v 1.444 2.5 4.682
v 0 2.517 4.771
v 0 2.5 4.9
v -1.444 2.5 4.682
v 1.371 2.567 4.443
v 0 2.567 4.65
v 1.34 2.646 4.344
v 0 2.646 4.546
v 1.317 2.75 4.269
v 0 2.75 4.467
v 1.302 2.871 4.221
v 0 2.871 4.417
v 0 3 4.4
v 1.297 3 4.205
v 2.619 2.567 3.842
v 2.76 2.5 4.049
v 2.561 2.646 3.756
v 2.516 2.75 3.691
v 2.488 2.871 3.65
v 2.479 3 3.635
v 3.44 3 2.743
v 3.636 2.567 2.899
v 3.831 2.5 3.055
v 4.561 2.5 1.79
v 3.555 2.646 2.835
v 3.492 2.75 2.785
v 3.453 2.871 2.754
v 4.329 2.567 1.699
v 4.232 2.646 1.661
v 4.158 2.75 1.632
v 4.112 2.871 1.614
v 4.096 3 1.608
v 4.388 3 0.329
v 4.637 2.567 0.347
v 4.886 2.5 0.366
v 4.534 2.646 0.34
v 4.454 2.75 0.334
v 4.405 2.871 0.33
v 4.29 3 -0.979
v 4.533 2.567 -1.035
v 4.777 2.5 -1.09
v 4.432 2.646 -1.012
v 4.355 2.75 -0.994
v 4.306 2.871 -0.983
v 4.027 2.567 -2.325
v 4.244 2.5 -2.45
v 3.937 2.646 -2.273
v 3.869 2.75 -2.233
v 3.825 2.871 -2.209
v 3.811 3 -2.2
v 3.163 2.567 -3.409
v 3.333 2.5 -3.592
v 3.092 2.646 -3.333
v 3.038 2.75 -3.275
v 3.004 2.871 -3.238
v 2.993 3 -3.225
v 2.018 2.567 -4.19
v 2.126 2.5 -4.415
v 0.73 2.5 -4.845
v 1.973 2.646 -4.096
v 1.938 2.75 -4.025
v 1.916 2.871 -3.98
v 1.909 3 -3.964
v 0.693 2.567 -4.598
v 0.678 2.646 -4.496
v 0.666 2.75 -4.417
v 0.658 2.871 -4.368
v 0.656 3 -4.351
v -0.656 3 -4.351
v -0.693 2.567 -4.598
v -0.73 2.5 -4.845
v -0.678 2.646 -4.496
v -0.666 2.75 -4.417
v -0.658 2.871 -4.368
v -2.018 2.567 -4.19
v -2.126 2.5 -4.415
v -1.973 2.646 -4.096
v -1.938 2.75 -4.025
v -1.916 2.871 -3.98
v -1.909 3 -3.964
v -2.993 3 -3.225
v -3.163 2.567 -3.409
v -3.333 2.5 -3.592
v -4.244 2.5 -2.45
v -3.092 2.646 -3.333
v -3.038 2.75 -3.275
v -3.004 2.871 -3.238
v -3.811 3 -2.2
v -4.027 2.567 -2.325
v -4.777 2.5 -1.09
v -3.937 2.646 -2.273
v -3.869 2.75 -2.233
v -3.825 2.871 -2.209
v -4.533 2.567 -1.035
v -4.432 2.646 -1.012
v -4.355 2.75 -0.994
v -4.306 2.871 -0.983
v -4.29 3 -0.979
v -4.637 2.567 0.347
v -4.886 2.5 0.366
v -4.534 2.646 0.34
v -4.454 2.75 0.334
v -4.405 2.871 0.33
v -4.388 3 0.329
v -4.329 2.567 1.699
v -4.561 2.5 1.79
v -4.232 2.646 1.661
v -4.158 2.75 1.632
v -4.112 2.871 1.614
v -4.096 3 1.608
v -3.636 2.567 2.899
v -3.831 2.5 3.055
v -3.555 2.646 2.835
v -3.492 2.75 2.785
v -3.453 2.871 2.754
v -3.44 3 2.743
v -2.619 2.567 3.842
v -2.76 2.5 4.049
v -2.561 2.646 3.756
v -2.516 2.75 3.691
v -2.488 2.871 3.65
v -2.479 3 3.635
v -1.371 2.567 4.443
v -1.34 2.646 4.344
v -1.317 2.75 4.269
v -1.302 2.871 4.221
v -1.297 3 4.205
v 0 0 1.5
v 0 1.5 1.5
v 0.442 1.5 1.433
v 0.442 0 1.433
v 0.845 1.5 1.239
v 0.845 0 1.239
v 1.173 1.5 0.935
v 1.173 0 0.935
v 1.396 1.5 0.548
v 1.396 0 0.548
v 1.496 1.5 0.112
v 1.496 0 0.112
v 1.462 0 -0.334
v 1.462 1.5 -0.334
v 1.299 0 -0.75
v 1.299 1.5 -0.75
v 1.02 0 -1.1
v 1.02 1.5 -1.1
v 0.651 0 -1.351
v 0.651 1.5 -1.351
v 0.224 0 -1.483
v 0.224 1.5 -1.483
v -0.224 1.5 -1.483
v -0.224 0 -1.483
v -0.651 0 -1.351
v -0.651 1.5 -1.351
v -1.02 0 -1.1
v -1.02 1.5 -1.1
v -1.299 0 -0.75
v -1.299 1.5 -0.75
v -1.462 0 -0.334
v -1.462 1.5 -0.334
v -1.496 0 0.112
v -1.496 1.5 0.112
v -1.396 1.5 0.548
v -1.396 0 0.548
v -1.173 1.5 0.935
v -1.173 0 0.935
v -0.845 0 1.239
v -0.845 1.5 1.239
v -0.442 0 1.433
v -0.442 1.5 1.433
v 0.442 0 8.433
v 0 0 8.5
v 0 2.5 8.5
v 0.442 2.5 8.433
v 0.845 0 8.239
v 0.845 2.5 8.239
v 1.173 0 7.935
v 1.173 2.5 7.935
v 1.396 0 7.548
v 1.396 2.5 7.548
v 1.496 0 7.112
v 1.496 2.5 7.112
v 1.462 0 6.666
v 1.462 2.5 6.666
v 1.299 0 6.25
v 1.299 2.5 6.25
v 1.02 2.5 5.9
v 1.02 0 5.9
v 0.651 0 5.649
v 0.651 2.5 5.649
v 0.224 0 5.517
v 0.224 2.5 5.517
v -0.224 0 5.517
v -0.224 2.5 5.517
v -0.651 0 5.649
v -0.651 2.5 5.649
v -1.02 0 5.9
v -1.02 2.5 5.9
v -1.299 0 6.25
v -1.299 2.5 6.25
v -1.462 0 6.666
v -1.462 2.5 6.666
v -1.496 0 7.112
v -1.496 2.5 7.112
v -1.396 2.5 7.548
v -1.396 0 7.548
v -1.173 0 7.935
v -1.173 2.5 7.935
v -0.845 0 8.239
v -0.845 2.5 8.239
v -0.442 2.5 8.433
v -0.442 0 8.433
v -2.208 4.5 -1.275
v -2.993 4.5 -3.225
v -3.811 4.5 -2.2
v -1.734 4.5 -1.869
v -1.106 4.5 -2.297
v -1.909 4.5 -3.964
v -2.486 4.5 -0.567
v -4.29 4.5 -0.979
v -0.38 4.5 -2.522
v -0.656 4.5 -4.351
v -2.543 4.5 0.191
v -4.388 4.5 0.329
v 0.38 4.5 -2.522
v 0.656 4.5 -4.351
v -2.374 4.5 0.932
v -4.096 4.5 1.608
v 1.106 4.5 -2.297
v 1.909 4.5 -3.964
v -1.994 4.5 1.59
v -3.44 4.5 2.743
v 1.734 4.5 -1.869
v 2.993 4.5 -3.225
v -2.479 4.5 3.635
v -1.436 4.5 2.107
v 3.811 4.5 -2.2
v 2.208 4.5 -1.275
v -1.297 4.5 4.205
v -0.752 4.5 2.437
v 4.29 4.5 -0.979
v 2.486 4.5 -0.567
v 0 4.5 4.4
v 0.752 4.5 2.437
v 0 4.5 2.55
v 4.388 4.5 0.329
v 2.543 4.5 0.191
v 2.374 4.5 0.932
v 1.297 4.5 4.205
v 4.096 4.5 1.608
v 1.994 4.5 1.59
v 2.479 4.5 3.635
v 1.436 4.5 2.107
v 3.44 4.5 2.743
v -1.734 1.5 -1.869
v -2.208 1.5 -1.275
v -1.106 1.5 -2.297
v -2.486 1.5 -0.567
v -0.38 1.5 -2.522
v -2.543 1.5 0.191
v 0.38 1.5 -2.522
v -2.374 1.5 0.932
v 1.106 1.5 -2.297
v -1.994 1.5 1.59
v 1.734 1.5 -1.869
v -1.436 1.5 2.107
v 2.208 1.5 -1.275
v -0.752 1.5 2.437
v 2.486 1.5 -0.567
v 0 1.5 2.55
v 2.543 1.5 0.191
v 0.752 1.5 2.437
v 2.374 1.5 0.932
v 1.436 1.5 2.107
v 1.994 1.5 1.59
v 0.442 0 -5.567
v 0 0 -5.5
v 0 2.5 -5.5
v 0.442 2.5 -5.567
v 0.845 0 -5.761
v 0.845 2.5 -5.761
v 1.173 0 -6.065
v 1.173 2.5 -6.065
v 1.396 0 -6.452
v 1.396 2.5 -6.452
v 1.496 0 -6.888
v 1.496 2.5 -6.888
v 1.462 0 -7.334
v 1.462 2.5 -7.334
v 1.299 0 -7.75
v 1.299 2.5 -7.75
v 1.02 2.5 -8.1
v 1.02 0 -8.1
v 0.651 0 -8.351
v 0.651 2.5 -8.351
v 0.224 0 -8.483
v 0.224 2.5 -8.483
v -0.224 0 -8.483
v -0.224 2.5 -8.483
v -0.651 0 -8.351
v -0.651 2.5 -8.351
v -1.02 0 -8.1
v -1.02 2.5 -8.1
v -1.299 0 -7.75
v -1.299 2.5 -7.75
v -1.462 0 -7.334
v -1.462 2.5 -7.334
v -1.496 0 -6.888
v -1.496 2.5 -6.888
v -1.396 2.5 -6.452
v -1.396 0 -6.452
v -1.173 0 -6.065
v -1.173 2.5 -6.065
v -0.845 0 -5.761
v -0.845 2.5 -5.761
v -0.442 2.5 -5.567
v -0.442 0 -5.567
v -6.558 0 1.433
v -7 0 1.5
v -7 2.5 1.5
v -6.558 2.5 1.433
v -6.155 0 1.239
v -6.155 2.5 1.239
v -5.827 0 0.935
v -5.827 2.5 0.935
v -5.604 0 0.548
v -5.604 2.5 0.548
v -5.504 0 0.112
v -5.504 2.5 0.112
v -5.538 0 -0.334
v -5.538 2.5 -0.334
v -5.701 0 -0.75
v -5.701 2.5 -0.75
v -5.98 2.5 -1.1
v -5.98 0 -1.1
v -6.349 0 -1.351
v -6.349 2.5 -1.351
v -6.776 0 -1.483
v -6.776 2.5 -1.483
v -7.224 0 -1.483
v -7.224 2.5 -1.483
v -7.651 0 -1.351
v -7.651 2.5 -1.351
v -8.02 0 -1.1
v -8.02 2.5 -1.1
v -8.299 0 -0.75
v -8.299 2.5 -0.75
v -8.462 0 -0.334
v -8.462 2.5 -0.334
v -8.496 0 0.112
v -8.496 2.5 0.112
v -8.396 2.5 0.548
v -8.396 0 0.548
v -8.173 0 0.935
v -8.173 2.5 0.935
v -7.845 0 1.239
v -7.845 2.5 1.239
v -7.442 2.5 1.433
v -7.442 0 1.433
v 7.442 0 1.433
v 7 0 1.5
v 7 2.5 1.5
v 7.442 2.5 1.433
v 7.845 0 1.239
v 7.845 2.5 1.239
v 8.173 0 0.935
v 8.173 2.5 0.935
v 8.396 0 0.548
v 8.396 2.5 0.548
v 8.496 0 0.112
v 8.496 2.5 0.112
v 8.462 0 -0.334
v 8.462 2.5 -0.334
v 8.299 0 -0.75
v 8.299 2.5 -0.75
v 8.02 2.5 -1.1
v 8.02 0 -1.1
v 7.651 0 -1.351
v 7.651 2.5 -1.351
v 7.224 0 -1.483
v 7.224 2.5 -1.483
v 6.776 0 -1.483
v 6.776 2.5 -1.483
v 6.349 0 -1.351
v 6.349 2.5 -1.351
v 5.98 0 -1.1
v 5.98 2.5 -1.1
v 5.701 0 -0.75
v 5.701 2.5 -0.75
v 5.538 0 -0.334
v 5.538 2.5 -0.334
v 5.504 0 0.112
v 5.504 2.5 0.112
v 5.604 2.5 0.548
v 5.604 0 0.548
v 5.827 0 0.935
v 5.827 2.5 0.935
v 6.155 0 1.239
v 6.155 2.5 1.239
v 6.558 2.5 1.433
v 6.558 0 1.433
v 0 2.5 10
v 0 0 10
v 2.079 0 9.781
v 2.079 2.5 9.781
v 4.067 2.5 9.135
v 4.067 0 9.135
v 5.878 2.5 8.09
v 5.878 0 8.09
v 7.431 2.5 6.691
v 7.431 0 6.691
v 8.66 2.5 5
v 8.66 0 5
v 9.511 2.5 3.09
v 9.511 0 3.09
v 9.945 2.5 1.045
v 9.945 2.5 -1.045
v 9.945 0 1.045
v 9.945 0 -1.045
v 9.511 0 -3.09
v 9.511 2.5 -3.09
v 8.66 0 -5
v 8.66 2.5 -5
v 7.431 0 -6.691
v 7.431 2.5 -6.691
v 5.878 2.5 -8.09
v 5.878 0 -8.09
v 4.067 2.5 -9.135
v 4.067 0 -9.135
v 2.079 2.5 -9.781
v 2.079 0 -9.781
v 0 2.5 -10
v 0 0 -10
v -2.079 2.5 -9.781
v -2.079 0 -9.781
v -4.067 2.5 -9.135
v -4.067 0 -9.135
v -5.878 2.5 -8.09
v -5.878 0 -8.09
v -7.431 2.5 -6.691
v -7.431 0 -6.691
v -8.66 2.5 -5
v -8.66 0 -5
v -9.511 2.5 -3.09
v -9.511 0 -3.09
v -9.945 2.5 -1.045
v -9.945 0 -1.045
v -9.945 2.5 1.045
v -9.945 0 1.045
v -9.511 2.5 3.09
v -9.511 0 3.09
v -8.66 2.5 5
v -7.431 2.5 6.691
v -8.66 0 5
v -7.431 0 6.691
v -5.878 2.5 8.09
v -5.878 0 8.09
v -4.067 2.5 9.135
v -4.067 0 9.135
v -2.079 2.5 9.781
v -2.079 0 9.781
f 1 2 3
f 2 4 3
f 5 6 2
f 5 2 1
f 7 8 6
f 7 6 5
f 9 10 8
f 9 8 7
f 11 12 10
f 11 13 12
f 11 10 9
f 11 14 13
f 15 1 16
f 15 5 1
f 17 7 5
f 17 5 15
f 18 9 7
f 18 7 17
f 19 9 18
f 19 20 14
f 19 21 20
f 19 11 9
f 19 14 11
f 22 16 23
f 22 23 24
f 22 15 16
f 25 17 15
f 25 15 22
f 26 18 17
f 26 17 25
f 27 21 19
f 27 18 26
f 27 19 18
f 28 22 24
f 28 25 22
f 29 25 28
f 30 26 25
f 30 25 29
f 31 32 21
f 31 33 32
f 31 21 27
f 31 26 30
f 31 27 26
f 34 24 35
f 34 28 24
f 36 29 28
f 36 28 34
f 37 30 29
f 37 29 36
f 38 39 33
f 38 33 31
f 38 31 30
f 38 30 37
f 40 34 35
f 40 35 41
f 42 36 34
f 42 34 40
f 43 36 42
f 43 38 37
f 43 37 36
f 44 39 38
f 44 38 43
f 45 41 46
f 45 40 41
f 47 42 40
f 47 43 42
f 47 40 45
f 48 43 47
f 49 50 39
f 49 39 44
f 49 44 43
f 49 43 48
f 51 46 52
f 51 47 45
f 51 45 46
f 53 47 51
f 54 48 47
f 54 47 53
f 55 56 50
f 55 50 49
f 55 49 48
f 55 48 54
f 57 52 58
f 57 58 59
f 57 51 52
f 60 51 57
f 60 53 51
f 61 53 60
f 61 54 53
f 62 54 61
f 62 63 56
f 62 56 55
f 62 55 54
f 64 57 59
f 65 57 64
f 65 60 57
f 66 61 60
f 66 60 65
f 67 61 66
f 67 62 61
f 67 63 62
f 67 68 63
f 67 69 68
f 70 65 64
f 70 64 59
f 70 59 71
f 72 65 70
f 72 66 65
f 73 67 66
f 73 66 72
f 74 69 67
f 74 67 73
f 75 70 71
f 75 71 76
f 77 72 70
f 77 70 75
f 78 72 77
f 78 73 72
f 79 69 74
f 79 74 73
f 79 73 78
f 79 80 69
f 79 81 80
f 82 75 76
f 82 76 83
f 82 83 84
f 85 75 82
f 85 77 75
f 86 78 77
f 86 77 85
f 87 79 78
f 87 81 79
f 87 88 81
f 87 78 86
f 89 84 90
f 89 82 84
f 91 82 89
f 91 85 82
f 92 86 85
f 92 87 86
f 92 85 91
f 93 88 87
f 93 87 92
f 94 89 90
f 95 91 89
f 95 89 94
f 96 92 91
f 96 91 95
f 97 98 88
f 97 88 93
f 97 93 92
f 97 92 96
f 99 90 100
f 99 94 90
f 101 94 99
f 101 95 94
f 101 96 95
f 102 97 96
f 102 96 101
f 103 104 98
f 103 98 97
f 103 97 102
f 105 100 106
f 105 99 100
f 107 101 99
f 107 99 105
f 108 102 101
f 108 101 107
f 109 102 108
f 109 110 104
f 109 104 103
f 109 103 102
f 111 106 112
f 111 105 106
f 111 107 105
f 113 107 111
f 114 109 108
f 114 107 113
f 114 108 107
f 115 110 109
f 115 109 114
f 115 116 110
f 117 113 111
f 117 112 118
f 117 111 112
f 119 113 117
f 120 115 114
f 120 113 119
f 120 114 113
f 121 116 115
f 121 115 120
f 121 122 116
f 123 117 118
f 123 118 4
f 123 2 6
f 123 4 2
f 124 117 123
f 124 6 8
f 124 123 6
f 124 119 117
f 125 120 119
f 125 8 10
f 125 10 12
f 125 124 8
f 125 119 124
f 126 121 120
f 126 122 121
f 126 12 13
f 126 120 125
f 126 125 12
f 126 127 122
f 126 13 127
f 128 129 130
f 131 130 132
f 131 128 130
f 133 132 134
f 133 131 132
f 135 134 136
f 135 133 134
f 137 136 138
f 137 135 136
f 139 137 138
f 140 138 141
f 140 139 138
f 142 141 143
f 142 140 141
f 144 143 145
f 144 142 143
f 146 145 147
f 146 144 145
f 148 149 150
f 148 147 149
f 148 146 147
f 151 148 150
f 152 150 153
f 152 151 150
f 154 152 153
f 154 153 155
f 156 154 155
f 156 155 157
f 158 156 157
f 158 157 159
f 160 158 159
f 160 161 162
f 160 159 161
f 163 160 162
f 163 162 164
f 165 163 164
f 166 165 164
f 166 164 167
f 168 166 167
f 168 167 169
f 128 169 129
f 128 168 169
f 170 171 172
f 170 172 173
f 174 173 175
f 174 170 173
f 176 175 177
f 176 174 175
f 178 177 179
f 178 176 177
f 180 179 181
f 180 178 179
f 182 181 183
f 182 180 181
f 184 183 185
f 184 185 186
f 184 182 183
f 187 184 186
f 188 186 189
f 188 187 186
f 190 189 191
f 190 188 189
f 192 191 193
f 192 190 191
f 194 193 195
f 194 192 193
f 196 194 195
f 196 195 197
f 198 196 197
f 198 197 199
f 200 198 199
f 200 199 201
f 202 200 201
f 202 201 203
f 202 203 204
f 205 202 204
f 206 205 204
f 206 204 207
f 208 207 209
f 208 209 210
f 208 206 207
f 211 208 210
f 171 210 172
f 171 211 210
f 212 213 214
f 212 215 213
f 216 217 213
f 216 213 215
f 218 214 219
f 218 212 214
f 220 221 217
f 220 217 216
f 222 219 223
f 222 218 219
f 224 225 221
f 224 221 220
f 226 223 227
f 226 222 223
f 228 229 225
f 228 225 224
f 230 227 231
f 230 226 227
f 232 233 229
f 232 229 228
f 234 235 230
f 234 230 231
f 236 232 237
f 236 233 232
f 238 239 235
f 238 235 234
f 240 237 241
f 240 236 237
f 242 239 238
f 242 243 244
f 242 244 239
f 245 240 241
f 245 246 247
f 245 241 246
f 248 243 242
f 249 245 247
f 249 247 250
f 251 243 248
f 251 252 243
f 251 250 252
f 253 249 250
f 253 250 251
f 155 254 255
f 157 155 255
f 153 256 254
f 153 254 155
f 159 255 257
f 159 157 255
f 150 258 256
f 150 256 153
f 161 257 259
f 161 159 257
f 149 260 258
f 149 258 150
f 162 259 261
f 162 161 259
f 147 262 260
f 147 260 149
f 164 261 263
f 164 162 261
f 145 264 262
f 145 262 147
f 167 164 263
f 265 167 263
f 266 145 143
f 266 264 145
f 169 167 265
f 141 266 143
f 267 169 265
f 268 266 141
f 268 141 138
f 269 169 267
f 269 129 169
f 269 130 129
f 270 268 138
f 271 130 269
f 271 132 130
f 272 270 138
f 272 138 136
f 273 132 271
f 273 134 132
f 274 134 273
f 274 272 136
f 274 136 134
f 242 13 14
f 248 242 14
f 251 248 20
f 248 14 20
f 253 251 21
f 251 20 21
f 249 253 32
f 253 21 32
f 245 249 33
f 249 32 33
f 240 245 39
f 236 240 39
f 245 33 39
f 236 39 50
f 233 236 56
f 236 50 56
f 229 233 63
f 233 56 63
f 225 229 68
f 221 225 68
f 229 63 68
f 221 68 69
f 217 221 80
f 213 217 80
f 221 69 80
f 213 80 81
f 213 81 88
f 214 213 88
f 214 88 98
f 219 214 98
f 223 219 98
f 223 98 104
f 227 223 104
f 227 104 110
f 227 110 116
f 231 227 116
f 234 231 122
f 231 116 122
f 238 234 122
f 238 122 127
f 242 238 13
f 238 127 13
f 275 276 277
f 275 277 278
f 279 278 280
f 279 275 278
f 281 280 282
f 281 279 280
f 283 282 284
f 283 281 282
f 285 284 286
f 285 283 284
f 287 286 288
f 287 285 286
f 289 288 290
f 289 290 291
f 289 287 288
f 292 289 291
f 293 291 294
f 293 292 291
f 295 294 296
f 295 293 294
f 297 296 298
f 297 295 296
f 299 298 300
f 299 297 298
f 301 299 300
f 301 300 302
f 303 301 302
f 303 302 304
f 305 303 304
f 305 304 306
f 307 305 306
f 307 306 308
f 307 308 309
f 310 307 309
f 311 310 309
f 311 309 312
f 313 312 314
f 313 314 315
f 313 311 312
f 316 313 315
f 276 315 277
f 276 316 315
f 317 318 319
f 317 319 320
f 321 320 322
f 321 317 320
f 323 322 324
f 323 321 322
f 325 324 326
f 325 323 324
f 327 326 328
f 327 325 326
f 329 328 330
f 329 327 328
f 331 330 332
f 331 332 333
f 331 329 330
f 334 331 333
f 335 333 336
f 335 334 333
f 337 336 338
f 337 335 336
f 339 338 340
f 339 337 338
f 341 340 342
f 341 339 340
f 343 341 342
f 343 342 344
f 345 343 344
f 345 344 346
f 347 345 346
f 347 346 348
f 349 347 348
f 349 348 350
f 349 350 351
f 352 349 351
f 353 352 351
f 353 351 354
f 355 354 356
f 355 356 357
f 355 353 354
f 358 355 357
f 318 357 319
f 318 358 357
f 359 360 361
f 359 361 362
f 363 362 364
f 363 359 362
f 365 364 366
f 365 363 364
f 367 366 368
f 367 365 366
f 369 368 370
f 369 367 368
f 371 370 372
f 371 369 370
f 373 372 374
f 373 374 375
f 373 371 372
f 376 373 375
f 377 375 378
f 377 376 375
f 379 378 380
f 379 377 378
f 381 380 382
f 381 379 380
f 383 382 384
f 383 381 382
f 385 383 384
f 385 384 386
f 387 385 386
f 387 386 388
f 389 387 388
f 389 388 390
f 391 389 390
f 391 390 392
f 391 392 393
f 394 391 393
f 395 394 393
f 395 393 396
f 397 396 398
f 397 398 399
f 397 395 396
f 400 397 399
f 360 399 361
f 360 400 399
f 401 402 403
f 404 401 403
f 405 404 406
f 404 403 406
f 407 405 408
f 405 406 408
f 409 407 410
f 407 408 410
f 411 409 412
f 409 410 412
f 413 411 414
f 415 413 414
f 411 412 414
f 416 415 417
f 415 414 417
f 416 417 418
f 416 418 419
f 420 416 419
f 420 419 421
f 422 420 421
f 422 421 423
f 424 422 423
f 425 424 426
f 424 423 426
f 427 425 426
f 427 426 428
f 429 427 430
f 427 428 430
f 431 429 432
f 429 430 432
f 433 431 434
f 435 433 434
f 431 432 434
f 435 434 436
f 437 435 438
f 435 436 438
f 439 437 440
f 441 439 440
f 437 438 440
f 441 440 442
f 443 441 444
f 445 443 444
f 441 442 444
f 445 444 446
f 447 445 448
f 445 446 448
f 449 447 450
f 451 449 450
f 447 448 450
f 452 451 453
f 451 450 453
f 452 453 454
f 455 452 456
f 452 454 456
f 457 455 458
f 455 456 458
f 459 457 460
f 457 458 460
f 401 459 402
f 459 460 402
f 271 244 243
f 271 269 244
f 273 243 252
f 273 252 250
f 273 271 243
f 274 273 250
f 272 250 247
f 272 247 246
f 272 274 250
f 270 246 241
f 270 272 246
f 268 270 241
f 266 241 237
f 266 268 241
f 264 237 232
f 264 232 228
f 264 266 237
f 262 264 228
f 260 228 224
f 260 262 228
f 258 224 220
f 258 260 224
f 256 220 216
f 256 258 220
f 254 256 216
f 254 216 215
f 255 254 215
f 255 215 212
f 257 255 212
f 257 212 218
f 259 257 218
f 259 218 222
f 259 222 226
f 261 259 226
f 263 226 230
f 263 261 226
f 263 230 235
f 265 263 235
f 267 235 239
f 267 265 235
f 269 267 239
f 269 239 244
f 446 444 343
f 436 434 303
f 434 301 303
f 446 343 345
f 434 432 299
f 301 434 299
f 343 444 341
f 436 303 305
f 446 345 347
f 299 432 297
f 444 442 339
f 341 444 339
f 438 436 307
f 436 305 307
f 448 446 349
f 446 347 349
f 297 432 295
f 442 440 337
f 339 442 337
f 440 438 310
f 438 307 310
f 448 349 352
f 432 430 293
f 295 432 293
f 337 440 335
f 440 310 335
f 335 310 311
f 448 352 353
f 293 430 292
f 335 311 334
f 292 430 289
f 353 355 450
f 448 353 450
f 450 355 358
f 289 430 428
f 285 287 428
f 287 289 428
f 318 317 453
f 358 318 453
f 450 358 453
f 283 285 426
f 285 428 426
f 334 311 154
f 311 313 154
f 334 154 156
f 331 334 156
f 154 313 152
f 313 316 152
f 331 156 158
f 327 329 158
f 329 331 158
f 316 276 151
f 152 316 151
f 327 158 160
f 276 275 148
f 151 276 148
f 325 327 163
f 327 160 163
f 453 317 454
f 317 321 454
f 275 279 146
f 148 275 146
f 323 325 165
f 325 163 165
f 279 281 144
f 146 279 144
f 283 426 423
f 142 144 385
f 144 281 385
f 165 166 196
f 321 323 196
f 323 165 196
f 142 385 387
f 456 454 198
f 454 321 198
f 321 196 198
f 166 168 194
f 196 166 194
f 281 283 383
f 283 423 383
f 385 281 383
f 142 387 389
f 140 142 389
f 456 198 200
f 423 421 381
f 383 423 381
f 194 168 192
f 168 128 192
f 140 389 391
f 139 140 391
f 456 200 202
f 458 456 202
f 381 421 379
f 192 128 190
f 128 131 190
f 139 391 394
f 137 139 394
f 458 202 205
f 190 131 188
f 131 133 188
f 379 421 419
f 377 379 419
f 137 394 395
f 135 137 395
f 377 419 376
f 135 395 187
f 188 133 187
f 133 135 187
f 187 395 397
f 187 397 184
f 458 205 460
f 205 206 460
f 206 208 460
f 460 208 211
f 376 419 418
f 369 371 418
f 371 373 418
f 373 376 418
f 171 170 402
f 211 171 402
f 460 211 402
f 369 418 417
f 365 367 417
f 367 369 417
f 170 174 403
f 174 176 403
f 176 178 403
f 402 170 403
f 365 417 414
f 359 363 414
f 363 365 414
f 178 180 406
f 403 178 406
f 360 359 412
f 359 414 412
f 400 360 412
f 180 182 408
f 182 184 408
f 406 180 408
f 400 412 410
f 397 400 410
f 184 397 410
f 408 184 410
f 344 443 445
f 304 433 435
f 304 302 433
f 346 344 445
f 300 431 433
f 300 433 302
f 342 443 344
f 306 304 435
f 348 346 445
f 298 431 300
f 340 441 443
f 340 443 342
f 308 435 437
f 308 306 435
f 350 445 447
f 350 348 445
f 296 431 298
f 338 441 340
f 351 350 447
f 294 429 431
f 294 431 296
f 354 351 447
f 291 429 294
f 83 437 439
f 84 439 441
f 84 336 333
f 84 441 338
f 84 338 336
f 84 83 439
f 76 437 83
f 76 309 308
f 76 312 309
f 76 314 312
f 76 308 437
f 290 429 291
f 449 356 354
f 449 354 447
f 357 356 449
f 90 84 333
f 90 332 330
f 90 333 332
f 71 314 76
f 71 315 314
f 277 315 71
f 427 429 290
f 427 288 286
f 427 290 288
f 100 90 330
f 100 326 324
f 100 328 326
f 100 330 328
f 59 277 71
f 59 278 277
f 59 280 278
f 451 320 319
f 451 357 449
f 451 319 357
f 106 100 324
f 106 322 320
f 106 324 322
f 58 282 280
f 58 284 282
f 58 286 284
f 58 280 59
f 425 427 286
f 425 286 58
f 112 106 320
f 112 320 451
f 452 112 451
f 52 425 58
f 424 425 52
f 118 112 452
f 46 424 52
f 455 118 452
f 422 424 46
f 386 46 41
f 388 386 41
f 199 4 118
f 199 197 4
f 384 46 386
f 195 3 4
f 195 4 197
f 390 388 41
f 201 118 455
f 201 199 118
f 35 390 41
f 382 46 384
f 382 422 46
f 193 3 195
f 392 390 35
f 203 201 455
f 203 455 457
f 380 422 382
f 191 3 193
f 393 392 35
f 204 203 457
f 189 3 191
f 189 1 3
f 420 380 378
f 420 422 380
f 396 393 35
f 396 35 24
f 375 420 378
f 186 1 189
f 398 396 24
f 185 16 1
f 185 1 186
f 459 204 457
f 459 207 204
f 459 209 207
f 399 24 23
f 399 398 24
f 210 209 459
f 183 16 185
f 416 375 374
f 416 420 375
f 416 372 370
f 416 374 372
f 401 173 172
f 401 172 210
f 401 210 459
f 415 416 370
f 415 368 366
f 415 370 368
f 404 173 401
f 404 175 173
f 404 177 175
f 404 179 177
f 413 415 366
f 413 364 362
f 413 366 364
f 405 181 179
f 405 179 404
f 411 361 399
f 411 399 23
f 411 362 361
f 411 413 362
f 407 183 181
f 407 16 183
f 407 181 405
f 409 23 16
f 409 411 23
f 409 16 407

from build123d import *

# Parameters (mm, degrees)
SKETCH_1_R          = 10
SKETCH_1_R_2        = 1.5
EXTRUDE_1_DEPTH     = 2.5
SKETCH_2_R          = 4.4
SKETCH_2_R_2        = 2.55
EXTRUDE_2_DEPTH     = 2
FILLET_1_R          = 0.5
CUT_EXTRUDE_START   = -1
SKETCH_3_R          = 2.55
CUT_EXTRUDE_1_DEPTH = 1


with BuildPart() as part:
    # 草图1 → 凸台-拉伸1 (new body)
    with BuildSketch(Plane(origin=(0, 0, 0), x_dir=(1, 0, 0), z_dir=(0, 1, 0))):
        with Locations(Location((0, 0, 0), (0, 0, 270))):
            Circle(SKETCH_1_R)
        with Locations(Location((7, 0, 0), (0, 0, 270))):
            Circle(SKETCH_1_R_2, mode=Mode.SUBTRACT)
        with Locations(Location((0, 7, 0), (0, 0, 270))):
            Circle(SKETCH_1_R_2, mode=Mode.SUBTRACT)
        with Locations(Location((0, -7, 0), (0, 0, 270))):
            Circle(SKETCH_1_R_2, mode=Mode.SUBTRACT)
        with Locations(Location((-7, 0, 0), (0, 0, 270))):
            Circle(SKETCH_1_R_2, mode=Mode.SUBTRACT)
        with Locations(Location((0, 0, 0), (0, 0, 270))):
            Circle(SKETCH_1_R_2, mode=Mode.SUBTRACT)
    extrude(amount=EXTRUDE_1_DEPTH)

    # 草图2 → 凸台-拉伸2 (add)
    with BuildSketch(Plane(origin=(0, 2.5, 0), x_dir=(1, 0, 0), z_dir=(0, 1, 0))):
        with Locations(Location((0, 0, 0), (0, 0, 270))):
            Circle(SKETCH_2_R)
        with Locations(Location((0, 0, 0), (0, 0, 270))):
            Circle(SKETCH_2_R_2, mode=Mode.SUBTRACT)
    extrude(amount=EXTRUDE_2_DEPTH)

    # 圆角1
    fillet_1_edges = [part.edges().sort_by_distance(p)[0] for p in [
        (0, 2.5, -4.4),
    ]]
    fillet(fillet_1_edges, radius=FILLET_1_R)

    # 草图3 → 切除-拉伸1 (cut)
    with BuildSketch(Plane(origin=(0, 2.5, 0), x_dir=(1, 0, 0), z_dir=(0, 1, 0)).offset(CUT_EXTRUDE_START)):
        with Locations(Location((0, 0, 0), (0, 0, 270))):
            Circle(SKETCH_3_R)
    extrude(amount=CUT_EXTRUDE_1_DEPTH, mode=Mode.SUBTRACT)


solid = part.part
